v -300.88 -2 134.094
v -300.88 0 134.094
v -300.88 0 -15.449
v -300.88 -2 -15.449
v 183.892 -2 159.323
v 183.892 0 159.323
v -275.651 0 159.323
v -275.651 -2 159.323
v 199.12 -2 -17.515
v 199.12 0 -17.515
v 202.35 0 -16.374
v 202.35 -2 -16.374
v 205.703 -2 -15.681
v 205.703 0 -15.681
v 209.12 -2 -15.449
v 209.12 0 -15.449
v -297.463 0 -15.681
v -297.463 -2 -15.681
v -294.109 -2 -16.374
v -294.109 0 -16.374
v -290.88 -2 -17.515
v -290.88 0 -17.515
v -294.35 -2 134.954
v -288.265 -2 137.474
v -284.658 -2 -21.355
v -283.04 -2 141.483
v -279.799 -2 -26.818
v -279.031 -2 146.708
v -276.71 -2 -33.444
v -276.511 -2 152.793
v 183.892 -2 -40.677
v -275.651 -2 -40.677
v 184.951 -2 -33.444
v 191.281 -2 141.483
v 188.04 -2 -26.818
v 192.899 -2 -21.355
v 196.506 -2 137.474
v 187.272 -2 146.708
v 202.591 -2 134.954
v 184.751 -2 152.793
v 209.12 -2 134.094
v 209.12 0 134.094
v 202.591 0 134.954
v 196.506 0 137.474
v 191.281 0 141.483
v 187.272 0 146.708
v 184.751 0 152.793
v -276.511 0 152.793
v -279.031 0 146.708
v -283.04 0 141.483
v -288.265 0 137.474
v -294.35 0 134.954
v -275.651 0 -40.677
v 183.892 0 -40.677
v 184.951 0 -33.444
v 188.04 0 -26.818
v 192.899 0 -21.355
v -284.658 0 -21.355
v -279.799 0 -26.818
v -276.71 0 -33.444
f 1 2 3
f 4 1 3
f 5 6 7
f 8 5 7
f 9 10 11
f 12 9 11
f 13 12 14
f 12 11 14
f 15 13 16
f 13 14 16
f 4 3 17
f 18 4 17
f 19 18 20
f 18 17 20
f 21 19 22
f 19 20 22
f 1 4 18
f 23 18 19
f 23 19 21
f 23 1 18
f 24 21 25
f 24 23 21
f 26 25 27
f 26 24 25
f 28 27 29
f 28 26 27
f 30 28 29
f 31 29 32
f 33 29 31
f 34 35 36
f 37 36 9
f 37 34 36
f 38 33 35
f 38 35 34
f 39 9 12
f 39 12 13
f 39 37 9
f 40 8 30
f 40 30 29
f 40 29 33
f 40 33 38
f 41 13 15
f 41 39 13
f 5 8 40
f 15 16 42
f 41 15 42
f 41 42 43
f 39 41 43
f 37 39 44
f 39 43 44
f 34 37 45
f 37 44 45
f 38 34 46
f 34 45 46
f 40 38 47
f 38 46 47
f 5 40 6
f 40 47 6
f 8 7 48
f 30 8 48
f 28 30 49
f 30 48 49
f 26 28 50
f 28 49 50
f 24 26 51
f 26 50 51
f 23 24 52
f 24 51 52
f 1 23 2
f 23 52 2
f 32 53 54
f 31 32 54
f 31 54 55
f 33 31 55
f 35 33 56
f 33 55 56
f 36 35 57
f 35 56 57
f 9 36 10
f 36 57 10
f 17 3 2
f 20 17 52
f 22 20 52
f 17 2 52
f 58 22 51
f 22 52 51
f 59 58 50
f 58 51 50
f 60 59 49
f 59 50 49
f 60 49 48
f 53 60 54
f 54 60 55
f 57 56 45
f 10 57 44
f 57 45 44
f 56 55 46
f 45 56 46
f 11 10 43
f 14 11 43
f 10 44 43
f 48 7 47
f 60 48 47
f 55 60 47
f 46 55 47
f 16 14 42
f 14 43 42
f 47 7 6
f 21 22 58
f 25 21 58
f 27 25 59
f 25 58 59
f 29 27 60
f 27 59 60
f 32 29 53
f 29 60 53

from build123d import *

# Parameters (mm, degrees)
F1_DEPTH = 2


with BuildPart() as f1:
    # F0 (on Front) → F1 (new body)
    with BuildSketch(Plane.XZ):
        with BuildLine():
            Line((-300.879598, 134.094029), (-300.879598, 129.322585))
            Line((-300.879598, 129.322585), (-300.879598, -15.448859))
            ThreePointArc((-300.879598, -15.448859), (-295.773951, -15.97089), (-290.879598, -17.515377))
            ThreePointArc((-290.879598, -17.515377), (-279.799209, -26.8175), (-275.651042, -40.677415))
            Line((-275.651042, -40.677415), (183.891847, -40.677415))
            ThreePointArc((183.891847, -40.677415), (188.040014, -26.8175), (199.120402, -17.515377))
            ThreePointArc((199.120402, -17.515377), (204.014756, -15.97089), (209.120402, -15.448859))
            Line((209.120402, -15.448859), (209.120402, 134.094029))
            ThreePointArc((209.120402, 134.094029), (191.281119, 141.483302), (183.891847, 159.322585))
            Line((183.891847, 159.322585), (-275.651042, 159.322585))
            ThreePointArc((-275.651042, 159.322585), (-283.040315, 141.483302), (-300.879598, 134.094029))
        make_face()
    extrude(amount=F1_DEPTH)


solid = f1.part
